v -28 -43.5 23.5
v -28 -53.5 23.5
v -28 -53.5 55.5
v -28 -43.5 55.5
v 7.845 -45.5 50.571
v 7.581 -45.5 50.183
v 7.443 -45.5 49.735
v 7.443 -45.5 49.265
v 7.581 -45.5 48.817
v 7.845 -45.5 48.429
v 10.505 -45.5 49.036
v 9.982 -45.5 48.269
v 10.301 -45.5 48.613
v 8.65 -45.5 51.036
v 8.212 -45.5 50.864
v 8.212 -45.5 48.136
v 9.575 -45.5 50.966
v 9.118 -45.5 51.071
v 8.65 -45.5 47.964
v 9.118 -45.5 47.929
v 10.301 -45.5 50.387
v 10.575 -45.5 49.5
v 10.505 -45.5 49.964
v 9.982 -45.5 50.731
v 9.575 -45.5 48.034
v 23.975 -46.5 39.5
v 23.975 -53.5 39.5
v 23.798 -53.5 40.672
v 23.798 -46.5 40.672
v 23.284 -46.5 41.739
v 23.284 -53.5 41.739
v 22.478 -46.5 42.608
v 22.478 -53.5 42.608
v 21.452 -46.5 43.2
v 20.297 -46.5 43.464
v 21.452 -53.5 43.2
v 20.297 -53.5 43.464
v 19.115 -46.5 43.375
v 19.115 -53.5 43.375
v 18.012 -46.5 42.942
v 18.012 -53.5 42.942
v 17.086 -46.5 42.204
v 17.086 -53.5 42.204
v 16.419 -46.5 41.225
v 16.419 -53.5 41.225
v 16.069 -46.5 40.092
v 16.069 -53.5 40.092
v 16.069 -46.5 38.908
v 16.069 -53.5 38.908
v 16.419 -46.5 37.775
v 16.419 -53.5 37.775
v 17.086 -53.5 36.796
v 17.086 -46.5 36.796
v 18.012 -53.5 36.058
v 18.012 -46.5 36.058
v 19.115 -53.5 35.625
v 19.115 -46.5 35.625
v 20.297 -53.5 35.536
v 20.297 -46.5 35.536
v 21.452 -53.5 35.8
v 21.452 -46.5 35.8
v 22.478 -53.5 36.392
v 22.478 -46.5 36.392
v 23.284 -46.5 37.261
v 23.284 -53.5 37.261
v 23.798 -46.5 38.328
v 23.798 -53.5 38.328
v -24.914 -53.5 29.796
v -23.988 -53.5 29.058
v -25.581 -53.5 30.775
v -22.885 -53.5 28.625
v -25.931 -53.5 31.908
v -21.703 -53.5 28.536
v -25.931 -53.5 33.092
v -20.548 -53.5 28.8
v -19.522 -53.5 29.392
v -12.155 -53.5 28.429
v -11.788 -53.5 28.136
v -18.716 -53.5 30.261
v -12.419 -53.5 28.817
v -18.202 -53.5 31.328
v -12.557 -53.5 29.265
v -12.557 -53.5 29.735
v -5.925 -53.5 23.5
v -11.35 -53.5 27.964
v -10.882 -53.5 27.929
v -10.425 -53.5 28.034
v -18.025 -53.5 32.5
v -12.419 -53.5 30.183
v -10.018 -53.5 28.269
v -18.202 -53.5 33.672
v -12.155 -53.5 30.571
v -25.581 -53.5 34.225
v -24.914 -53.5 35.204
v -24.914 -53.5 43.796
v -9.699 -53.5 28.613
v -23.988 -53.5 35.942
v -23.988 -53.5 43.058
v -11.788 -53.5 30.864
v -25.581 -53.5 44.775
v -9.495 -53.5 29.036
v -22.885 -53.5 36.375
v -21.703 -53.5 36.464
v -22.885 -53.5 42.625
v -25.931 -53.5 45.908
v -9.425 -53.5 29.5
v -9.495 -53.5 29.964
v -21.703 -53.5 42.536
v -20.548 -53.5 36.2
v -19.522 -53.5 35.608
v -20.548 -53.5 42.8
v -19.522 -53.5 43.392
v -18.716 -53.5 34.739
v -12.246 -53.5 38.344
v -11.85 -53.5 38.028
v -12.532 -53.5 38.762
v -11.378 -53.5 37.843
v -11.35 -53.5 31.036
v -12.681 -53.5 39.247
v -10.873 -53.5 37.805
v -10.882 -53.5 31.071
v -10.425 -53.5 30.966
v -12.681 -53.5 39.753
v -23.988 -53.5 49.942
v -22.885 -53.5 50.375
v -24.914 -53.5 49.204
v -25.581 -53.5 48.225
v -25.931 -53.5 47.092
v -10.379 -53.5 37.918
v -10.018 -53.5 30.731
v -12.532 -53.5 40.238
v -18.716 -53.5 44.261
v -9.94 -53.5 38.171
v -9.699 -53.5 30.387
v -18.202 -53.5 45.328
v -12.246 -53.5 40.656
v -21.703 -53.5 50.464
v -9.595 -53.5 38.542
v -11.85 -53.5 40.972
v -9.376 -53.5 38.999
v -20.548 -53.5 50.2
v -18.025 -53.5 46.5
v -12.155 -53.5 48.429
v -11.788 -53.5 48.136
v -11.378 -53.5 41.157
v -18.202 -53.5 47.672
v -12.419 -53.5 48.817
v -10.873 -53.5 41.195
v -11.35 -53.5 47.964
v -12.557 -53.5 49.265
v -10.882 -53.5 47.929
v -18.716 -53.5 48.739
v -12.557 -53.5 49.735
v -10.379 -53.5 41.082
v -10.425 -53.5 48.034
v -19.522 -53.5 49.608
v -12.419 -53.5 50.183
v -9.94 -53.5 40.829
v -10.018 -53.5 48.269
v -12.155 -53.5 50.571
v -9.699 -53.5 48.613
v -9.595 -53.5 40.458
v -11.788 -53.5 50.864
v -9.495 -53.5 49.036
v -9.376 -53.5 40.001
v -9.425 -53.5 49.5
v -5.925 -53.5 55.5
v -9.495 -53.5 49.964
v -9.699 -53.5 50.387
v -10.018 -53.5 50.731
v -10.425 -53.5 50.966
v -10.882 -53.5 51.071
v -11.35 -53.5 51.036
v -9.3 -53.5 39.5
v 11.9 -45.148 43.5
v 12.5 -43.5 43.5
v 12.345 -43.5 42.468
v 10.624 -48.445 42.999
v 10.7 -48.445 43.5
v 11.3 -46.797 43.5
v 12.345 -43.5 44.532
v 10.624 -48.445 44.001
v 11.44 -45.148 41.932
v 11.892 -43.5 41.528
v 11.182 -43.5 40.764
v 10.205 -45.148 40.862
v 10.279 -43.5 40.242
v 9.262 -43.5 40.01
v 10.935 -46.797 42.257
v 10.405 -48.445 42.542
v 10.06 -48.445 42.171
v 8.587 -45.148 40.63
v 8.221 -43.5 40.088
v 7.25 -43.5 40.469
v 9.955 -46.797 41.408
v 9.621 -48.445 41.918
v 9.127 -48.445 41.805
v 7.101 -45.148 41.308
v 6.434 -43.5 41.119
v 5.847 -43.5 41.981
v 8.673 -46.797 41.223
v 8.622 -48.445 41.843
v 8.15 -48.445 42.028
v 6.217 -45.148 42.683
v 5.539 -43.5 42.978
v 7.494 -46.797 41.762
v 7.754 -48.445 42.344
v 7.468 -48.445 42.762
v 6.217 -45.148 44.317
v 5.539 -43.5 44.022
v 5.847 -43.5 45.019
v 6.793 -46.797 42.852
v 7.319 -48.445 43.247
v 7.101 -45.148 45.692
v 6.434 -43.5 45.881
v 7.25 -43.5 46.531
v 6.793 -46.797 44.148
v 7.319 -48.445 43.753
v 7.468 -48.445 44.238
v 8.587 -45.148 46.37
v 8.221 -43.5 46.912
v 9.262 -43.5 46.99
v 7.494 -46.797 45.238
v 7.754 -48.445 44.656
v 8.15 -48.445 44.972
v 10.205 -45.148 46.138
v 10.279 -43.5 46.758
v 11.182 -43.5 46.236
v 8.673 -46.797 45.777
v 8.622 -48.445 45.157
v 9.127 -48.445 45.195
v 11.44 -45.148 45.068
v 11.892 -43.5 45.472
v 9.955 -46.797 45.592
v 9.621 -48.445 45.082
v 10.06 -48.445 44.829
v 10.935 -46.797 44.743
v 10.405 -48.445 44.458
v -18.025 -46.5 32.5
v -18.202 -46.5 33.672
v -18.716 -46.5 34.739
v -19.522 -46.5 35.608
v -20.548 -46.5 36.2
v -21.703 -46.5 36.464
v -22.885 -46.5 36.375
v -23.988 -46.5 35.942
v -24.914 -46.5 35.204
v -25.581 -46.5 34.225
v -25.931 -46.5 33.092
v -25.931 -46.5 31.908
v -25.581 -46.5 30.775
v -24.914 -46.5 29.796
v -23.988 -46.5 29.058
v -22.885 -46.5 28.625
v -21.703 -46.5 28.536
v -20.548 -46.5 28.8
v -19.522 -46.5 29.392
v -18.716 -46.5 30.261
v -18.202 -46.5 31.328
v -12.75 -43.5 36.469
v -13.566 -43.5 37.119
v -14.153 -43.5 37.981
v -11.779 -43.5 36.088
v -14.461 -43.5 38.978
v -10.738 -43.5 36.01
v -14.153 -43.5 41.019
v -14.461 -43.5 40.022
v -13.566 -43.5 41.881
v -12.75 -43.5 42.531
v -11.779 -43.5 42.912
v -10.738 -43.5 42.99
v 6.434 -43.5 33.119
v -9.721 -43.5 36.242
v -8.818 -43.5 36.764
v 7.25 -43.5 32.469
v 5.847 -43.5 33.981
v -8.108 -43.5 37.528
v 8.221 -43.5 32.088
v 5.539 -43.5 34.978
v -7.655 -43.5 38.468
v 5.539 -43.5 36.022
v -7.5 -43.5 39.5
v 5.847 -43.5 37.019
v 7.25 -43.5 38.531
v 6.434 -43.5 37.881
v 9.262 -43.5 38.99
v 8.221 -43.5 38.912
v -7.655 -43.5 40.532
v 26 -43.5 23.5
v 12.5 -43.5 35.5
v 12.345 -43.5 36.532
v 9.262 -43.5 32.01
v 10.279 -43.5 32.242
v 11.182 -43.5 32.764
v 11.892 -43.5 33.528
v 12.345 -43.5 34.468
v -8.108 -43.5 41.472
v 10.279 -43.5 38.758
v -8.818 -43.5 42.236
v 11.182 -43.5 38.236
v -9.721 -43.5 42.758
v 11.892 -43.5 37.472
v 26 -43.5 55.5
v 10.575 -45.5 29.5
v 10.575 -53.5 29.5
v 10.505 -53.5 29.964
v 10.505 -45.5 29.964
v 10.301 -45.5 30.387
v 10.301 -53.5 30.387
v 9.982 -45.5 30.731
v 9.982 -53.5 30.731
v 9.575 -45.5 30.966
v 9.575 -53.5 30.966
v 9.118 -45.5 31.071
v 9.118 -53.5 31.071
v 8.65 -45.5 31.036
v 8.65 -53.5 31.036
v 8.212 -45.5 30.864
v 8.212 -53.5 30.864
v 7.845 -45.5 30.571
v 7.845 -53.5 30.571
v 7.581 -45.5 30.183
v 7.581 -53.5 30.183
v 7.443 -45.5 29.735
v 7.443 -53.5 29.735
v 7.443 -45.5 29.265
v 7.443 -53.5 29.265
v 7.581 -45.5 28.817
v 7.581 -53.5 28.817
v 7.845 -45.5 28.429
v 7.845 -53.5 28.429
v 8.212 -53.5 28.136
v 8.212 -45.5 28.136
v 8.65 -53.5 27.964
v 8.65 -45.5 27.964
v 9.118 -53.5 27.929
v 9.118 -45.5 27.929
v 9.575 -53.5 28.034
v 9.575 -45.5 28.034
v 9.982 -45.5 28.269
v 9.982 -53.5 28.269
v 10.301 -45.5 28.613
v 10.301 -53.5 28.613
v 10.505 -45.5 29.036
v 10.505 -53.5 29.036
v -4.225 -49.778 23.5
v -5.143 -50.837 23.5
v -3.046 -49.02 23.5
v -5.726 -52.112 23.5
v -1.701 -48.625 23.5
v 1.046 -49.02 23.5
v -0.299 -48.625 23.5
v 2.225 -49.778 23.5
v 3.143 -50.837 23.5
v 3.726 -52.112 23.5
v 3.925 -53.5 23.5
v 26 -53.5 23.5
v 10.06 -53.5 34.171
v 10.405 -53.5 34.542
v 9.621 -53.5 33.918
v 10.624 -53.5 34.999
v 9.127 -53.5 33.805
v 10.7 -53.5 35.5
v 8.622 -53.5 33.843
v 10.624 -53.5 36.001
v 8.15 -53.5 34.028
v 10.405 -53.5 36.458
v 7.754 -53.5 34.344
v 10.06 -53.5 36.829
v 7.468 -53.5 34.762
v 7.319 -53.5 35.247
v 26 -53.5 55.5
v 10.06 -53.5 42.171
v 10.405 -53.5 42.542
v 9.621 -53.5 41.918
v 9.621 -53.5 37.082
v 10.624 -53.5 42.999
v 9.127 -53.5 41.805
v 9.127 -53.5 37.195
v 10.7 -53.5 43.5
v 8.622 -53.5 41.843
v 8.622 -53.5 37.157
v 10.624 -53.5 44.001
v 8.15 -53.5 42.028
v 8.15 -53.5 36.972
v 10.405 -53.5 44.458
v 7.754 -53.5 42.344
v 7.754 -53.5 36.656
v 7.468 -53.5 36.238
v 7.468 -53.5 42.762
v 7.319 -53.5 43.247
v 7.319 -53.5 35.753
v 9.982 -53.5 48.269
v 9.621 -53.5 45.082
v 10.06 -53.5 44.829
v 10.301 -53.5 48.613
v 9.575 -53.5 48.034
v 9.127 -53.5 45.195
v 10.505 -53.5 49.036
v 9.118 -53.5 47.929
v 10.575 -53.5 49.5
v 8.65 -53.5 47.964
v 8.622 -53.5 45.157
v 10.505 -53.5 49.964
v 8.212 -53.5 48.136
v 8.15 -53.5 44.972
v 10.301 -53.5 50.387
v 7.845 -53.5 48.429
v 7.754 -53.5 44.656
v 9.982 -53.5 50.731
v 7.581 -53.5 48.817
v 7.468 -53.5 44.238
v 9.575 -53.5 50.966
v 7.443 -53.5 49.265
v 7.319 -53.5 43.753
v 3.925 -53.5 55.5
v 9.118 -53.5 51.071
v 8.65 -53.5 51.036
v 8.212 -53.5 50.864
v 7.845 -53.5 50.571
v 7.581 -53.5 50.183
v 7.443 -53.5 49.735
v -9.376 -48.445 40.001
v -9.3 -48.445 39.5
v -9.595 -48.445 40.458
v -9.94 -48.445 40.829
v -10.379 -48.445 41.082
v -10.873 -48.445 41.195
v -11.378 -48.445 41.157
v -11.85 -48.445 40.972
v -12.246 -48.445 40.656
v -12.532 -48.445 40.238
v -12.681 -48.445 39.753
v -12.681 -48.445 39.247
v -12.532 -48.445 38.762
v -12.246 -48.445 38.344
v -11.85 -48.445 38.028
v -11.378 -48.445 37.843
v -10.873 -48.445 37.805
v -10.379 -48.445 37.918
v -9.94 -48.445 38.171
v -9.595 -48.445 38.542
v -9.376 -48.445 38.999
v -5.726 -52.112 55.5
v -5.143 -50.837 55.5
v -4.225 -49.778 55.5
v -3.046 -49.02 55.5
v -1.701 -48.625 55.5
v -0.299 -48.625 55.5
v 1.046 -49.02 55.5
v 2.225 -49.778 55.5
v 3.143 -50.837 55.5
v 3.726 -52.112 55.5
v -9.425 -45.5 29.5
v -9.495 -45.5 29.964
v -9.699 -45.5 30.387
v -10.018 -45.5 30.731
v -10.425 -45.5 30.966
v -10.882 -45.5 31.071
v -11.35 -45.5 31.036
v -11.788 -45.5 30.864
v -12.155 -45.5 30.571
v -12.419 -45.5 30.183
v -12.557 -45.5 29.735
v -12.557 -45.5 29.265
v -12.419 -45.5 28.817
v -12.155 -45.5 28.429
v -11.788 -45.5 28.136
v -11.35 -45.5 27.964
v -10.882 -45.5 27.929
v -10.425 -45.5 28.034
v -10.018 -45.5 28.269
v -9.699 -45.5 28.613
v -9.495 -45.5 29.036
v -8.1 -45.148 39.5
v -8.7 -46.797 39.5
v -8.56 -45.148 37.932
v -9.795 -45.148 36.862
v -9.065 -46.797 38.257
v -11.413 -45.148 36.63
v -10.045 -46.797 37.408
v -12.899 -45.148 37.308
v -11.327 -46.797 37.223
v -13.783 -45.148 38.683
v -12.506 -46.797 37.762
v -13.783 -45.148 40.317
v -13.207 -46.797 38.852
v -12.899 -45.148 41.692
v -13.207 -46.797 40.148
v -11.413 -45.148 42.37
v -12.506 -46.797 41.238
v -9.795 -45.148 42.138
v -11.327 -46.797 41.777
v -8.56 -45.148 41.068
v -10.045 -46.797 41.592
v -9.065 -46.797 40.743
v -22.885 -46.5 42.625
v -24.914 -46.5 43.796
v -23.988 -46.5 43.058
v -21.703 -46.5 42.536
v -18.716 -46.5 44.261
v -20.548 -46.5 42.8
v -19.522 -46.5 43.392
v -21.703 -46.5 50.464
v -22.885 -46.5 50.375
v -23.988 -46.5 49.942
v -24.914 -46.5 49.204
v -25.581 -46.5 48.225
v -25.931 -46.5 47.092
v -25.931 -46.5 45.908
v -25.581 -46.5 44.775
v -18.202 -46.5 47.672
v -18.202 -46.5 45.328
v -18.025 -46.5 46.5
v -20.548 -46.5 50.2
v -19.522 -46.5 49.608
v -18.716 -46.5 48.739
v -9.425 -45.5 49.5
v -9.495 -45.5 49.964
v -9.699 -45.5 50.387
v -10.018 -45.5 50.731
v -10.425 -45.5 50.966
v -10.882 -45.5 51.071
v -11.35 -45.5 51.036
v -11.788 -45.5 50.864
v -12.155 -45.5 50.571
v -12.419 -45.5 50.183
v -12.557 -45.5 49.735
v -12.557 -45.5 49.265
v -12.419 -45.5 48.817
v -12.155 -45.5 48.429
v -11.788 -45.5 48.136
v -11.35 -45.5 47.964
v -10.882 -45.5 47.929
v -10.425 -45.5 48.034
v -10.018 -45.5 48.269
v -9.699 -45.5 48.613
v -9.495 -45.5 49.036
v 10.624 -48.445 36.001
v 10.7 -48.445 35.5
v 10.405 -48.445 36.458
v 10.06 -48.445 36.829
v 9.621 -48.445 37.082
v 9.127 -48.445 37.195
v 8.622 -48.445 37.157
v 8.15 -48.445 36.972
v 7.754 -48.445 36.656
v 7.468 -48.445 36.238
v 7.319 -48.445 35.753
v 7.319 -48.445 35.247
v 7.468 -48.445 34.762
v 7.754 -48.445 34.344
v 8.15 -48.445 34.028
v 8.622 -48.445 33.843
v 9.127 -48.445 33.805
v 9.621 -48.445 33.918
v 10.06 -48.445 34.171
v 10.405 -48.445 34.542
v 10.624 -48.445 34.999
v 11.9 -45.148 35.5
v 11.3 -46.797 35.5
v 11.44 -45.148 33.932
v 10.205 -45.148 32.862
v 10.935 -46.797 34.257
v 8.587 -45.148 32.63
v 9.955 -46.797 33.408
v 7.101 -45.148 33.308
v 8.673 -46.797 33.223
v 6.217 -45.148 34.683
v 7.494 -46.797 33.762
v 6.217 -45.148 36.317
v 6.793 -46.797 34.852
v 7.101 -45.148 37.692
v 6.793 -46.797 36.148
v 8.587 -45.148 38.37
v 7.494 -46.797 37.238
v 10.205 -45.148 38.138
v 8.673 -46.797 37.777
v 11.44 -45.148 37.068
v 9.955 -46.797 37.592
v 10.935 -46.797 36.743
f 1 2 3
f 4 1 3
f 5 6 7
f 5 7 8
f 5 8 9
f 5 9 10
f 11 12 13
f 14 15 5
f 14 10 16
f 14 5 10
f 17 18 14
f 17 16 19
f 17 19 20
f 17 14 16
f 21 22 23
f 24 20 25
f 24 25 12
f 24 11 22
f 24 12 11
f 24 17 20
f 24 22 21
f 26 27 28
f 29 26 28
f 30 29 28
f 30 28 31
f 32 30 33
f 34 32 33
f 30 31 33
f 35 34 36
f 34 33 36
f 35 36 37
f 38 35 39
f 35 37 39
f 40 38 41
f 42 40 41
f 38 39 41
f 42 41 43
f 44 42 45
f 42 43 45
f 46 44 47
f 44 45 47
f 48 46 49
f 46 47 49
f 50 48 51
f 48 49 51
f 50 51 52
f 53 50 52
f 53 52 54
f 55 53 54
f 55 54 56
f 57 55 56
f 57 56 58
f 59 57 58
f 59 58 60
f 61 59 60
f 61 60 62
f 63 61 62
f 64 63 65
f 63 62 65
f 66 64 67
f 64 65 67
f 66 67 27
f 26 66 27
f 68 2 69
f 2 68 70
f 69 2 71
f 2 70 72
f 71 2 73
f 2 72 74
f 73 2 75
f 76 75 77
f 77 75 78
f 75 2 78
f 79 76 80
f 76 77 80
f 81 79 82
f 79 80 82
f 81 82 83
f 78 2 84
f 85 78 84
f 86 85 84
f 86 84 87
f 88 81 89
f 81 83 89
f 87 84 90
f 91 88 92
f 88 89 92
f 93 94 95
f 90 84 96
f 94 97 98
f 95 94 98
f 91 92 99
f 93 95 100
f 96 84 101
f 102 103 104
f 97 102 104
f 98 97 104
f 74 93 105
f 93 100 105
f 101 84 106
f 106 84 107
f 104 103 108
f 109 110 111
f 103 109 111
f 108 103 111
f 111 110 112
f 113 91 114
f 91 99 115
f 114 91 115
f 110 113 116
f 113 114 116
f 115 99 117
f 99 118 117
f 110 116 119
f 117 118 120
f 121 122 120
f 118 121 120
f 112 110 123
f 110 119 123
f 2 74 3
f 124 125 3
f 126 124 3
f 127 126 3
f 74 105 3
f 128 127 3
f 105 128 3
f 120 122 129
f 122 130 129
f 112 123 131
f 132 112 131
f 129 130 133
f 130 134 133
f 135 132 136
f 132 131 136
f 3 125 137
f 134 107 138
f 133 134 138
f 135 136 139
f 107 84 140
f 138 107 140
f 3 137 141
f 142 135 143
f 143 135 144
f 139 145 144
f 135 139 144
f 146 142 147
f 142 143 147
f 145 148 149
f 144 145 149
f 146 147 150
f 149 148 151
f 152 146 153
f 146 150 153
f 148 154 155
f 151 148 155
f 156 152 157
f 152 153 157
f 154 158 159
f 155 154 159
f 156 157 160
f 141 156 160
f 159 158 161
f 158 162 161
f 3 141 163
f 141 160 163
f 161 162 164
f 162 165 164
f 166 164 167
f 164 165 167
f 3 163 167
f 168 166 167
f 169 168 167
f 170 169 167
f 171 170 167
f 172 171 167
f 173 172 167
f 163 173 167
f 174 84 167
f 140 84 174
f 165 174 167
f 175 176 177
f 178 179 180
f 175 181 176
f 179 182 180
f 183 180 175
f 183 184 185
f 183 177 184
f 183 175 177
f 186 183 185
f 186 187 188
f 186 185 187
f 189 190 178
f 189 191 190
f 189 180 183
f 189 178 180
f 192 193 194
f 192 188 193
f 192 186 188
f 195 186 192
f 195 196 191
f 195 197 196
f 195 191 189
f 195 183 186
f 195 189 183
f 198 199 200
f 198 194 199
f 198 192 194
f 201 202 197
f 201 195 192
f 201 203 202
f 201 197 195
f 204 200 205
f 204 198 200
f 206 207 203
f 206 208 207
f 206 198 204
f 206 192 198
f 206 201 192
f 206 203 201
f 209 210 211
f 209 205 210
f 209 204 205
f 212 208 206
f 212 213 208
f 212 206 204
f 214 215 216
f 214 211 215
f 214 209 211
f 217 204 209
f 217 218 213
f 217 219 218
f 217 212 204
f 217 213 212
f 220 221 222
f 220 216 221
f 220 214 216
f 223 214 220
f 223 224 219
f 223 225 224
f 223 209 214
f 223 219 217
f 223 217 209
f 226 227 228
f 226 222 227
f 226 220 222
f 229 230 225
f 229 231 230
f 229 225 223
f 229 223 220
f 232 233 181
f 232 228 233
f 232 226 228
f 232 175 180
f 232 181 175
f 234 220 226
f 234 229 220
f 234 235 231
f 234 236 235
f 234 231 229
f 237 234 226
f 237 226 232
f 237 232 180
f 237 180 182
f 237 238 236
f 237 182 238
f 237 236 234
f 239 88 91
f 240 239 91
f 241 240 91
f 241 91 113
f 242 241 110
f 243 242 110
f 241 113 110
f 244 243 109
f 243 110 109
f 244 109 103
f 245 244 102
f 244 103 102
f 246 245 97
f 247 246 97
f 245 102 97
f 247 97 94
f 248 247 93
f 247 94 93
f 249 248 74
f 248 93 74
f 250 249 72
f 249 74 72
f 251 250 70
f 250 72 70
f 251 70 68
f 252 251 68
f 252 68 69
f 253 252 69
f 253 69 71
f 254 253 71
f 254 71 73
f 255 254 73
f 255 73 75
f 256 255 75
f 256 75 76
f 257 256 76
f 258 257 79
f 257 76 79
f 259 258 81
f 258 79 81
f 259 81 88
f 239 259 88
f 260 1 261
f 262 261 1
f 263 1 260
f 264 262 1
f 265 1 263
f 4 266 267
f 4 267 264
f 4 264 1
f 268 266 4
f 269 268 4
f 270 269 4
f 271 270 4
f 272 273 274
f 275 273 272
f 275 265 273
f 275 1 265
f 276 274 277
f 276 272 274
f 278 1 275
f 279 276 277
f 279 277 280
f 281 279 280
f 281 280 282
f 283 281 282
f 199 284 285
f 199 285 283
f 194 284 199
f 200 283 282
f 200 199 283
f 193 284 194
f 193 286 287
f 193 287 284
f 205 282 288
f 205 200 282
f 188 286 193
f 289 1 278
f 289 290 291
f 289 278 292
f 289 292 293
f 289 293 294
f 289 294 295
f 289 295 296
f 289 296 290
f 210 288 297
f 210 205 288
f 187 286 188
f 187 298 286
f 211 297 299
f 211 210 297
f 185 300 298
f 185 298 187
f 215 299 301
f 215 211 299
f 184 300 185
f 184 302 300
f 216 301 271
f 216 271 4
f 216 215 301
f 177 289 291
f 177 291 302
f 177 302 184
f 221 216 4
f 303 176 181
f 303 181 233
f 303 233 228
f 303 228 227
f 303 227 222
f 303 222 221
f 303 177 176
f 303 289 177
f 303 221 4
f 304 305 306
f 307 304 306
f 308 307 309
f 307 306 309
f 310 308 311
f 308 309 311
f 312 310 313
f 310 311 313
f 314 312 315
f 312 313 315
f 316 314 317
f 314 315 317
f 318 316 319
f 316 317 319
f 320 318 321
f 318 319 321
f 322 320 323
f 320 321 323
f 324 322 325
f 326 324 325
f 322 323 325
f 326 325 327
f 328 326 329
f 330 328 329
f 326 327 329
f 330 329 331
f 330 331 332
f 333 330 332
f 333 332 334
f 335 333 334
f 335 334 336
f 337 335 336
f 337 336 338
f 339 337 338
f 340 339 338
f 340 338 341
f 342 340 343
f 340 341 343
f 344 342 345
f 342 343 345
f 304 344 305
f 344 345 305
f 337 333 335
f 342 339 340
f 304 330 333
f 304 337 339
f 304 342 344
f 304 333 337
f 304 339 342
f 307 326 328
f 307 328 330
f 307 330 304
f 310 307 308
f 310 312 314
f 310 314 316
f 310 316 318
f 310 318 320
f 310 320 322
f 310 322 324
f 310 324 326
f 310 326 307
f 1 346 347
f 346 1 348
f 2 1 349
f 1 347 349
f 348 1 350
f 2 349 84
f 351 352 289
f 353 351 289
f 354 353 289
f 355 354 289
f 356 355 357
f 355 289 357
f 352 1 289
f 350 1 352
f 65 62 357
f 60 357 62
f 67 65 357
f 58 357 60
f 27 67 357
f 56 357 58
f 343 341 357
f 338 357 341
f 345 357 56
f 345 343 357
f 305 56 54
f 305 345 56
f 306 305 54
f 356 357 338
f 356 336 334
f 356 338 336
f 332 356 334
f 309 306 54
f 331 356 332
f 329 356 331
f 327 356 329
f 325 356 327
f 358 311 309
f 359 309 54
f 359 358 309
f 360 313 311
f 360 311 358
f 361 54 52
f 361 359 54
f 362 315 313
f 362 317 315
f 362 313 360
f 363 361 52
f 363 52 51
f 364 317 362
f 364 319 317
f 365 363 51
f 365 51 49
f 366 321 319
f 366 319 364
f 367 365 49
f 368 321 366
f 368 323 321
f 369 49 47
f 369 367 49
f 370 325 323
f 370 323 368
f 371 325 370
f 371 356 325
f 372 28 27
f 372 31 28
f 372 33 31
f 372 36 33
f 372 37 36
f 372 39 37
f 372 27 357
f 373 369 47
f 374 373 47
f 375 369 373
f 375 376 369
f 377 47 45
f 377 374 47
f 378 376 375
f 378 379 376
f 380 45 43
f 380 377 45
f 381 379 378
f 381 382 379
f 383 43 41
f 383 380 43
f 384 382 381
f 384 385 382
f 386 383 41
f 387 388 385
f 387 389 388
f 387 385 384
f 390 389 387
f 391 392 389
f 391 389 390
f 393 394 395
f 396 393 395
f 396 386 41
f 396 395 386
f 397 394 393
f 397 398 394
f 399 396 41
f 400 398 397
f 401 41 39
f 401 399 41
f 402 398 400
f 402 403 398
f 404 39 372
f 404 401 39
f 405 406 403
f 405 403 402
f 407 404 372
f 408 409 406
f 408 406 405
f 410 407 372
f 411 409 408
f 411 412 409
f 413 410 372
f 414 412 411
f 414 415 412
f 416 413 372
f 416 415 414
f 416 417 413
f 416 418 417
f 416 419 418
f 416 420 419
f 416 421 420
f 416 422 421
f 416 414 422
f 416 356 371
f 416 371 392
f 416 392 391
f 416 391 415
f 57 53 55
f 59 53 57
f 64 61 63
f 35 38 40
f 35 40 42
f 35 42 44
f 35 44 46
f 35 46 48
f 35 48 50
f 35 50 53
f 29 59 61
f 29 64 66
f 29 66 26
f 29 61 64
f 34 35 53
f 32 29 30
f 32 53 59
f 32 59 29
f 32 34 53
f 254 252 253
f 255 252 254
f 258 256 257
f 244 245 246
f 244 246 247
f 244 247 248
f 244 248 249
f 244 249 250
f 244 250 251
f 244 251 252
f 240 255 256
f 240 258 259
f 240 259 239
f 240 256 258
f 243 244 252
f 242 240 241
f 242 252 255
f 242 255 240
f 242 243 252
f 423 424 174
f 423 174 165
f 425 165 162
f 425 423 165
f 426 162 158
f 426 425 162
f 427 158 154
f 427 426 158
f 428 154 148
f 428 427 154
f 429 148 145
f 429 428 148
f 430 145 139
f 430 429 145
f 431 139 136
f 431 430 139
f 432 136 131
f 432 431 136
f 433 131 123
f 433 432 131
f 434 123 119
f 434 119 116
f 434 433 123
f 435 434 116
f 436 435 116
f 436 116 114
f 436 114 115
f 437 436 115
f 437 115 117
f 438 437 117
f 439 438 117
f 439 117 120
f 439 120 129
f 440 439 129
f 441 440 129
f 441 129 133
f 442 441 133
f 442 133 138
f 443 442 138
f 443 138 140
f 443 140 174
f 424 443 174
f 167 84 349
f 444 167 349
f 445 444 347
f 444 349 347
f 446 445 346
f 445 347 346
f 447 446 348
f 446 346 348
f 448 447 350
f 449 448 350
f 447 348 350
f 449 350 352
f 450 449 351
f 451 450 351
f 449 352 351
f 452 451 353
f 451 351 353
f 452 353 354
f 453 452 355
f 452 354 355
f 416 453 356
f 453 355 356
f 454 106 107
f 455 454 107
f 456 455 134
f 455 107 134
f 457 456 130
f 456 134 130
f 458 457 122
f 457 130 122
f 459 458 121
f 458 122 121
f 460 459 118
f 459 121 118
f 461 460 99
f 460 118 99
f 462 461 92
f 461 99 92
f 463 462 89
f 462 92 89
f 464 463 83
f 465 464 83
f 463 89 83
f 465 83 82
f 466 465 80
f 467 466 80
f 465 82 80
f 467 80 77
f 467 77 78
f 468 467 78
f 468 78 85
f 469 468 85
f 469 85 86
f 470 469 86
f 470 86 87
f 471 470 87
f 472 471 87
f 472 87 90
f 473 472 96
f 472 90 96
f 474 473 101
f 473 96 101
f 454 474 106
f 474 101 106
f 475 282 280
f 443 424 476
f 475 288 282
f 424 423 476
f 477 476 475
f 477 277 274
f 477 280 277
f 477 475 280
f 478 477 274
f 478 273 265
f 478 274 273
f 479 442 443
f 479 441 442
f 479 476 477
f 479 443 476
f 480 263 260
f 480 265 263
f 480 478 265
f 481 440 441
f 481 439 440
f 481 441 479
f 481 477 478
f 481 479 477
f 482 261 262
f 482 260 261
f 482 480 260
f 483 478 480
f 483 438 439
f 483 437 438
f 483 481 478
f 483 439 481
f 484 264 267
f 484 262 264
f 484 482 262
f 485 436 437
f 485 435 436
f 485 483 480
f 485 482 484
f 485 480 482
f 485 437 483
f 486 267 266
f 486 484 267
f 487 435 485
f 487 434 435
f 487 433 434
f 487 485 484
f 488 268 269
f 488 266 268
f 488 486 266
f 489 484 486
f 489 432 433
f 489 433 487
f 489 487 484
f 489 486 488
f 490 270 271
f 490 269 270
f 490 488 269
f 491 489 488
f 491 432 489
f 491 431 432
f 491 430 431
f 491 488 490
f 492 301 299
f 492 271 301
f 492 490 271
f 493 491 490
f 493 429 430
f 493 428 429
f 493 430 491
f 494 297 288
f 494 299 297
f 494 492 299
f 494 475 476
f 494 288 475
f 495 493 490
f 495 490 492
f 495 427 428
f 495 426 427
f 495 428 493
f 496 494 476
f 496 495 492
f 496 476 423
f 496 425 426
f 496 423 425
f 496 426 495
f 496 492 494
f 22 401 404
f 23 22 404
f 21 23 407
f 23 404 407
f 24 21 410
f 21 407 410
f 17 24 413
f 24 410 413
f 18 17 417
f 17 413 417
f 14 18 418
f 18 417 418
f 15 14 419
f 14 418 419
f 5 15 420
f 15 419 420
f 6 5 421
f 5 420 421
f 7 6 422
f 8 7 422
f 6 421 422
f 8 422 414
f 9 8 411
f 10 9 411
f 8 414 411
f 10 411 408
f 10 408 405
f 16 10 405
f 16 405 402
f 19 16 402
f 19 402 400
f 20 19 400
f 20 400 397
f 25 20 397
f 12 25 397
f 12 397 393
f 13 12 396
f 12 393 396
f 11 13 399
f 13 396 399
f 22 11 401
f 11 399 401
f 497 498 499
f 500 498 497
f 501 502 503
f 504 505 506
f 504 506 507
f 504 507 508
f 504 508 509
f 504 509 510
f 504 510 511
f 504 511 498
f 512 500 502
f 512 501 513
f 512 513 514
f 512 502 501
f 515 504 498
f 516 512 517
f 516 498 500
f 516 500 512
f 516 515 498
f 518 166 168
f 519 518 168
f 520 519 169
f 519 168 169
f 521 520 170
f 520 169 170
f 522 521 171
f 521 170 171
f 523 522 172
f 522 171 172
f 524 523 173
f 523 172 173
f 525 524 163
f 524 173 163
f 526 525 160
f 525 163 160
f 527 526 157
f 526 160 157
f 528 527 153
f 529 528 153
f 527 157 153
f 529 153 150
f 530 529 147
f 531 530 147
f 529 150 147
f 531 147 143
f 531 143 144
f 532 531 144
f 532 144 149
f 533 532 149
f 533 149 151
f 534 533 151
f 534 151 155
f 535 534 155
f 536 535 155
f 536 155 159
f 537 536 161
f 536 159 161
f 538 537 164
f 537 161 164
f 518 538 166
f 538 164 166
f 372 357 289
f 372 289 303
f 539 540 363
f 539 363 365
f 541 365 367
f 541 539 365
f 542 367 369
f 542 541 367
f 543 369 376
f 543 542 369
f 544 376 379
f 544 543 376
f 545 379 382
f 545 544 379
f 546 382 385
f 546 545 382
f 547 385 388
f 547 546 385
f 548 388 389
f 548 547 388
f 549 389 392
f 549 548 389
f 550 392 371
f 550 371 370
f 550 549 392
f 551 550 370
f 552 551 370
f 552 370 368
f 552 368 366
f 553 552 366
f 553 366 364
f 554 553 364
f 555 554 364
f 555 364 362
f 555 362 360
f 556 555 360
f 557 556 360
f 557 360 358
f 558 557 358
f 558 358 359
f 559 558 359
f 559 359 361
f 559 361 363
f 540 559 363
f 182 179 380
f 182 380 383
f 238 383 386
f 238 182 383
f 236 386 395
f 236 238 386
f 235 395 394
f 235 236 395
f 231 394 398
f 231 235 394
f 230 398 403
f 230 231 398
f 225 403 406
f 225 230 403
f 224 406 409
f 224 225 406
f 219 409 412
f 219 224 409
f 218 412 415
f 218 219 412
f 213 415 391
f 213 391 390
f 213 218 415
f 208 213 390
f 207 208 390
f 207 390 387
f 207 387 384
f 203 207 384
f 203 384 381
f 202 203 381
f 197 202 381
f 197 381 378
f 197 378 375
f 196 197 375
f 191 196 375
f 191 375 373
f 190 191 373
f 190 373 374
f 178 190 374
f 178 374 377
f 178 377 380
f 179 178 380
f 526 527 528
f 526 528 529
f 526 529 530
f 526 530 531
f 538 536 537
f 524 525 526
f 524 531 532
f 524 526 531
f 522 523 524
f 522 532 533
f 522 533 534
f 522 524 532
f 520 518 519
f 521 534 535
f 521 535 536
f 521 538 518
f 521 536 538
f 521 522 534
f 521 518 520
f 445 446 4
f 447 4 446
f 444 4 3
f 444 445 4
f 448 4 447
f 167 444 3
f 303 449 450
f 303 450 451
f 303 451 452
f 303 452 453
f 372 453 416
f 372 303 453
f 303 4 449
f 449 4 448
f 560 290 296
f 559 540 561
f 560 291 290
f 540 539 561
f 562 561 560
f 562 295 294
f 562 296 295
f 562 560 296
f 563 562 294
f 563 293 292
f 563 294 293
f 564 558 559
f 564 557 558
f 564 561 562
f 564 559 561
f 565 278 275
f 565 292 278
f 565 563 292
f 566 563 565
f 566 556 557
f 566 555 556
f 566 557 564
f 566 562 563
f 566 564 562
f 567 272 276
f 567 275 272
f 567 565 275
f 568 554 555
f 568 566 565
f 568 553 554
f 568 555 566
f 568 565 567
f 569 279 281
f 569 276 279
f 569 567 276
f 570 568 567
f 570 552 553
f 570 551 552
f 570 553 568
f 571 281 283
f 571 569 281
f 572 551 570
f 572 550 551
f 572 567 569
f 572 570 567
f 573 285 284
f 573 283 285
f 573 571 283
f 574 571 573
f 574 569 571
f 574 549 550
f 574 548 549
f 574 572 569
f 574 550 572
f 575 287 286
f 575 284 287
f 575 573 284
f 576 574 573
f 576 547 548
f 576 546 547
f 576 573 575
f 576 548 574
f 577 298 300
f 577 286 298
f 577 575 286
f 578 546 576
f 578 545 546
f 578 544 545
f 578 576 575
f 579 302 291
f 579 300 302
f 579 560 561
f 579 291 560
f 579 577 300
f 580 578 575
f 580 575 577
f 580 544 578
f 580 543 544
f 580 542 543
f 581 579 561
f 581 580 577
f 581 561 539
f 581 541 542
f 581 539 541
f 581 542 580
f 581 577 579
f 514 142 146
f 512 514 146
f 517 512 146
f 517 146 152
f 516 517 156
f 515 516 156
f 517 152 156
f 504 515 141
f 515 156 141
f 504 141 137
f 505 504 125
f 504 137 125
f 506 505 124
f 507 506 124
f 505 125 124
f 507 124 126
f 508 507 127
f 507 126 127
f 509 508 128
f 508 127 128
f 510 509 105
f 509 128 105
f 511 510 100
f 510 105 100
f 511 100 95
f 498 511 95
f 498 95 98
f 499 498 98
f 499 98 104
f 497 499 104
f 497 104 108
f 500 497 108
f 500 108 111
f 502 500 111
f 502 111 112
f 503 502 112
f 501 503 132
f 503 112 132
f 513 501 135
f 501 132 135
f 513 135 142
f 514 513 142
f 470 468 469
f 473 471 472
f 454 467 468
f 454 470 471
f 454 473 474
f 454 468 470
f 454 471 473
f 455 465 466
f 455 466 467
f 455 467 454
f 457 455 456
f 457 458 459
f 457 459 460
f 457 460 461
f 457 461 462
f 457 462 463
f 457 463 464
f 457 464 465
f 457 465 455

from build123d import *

# Parameters (mm, degrees)
SKETCH056_W     = 30
SKETCH056_H     = 32
SKETCH056_R     = 1.7
PAD037_DEPTH    = 10
SKETCH057_R     = 3.5
POCKET020_DEPTH = 5
POCKET020_TAPER = 20
SKETCH059_R     = 4.925
POCKET022_DEPTH = 32
SKETCH060_W     = 32
SKETCH060_H     = 10
PAD038_DEPTH    = 12
SKETCH062_R     = 1.575
POCKET024_DEPTH = 8
SKETCH086_R     = 3.975
POCKET037_DEPTH = 7


with BuildPart() as part:
    # Sketch056 → Pad037 (new body)
    with BuildSketch(Plane.XZ):
        Rectangle(SKETCH056_W, SKETCH056_H)
        with Locations((10, 4)):
            Circle(SKETCH056_R, mode=Mode.SUBTRACT)
        with Locations((10, -4)):
            Circle(SKETCH056_R, mode=Mode.SUBTRACT)
        with Locations((-10, 0)):
            Circle(SKETCH056_R, mode=Mode.SUBTRACT)
    extrude(amount=PAD037_DEPTH)

    # Sketch057 (on Face8 of Pad037) → Pocket020 (cut)
    with BuildSketch(Plane(origin=(0, 0, 0), x_dir=(1, 0, 0), z_dir=(0, 1, 0))):
        with Locations((-10, 0)):
            Circle(SKETCH057_R)
        with Locations((10, 4)):
            Circle(SKETCH057_R)
        with Locations((10, -4)):
            Circle(SKETCH057_R)
    extrude(amount=-POCKET020_DEPTH, taper=POCKET020_TAPER, mode=Mode.SUBTRACT)

    # Sketch059 (on Face1 of Pocket020) → Pocket022 (cut)
    with BuildSketch(Plane(origin=(0, 0, -16), x_dir=(1, 0, 0), z_dir=(0, 0, -1))):
        with Locations((0, 10)):
            Circle(SKETCH059_R)
    extrude(amount=-POCKET022_DEPTH, mode=Mode.SUBTRACT)

    # Sketch060 (on Face3 of Pocket022) → Pad038 (join)
    with BuildSketch(Plane(origin=(15, 0, 0), x_dir=(0, 0, 1), z_dir=(1, 0, 0))):
        with Locations((0, 5)):
            Rectangle(SKETCH060_W, SKETCH060_H)
    pad038 = extrude(amount=PAD038_DEPTH)

    # Sketch062 → Pocket024 (cut)
    with BuildSketch(Plane.XZ.offset(10)):
        with Locations((-10, 10)):
            Circle(SKETCH062_R)
        with Locations((-10, -10)):
            Circle(SKETCH062_R)
        with Locations((10, 10)):
            Circle(SKETCH062_R)
        with Locations((10, -10)):
            Circle(SKETCH062_R)
    extrude(amount=-POCKET024_DEPTH, mode=Mode.SUBTRACT)

    # Mirrored005: Pad038 across YZ
    add(pad038.mirror(Plane.YZ))

    # Sketch086 (on Face4 of Mirrored005) → Pocket037 (cut)
    with BuildSketch(Plane.XZ.offset(10)):
        with Locations((21, 0)):
            Circle(SKETCH086_R)
        with Locations((-21, 7)):
            Circle(SKETCH086_R)
        with Locations((-21, -7)):
            Circle(SKETCH086_R)
    extrude(amount=-POCKET037_DEPTH, mode=Mode.SUBTRACT)


with BuildPart() as part_1:
    # Body010 placement: moved
    add(part.part.moved(Location((-1, -43.5, 39.5))))


solid = part_1.part
